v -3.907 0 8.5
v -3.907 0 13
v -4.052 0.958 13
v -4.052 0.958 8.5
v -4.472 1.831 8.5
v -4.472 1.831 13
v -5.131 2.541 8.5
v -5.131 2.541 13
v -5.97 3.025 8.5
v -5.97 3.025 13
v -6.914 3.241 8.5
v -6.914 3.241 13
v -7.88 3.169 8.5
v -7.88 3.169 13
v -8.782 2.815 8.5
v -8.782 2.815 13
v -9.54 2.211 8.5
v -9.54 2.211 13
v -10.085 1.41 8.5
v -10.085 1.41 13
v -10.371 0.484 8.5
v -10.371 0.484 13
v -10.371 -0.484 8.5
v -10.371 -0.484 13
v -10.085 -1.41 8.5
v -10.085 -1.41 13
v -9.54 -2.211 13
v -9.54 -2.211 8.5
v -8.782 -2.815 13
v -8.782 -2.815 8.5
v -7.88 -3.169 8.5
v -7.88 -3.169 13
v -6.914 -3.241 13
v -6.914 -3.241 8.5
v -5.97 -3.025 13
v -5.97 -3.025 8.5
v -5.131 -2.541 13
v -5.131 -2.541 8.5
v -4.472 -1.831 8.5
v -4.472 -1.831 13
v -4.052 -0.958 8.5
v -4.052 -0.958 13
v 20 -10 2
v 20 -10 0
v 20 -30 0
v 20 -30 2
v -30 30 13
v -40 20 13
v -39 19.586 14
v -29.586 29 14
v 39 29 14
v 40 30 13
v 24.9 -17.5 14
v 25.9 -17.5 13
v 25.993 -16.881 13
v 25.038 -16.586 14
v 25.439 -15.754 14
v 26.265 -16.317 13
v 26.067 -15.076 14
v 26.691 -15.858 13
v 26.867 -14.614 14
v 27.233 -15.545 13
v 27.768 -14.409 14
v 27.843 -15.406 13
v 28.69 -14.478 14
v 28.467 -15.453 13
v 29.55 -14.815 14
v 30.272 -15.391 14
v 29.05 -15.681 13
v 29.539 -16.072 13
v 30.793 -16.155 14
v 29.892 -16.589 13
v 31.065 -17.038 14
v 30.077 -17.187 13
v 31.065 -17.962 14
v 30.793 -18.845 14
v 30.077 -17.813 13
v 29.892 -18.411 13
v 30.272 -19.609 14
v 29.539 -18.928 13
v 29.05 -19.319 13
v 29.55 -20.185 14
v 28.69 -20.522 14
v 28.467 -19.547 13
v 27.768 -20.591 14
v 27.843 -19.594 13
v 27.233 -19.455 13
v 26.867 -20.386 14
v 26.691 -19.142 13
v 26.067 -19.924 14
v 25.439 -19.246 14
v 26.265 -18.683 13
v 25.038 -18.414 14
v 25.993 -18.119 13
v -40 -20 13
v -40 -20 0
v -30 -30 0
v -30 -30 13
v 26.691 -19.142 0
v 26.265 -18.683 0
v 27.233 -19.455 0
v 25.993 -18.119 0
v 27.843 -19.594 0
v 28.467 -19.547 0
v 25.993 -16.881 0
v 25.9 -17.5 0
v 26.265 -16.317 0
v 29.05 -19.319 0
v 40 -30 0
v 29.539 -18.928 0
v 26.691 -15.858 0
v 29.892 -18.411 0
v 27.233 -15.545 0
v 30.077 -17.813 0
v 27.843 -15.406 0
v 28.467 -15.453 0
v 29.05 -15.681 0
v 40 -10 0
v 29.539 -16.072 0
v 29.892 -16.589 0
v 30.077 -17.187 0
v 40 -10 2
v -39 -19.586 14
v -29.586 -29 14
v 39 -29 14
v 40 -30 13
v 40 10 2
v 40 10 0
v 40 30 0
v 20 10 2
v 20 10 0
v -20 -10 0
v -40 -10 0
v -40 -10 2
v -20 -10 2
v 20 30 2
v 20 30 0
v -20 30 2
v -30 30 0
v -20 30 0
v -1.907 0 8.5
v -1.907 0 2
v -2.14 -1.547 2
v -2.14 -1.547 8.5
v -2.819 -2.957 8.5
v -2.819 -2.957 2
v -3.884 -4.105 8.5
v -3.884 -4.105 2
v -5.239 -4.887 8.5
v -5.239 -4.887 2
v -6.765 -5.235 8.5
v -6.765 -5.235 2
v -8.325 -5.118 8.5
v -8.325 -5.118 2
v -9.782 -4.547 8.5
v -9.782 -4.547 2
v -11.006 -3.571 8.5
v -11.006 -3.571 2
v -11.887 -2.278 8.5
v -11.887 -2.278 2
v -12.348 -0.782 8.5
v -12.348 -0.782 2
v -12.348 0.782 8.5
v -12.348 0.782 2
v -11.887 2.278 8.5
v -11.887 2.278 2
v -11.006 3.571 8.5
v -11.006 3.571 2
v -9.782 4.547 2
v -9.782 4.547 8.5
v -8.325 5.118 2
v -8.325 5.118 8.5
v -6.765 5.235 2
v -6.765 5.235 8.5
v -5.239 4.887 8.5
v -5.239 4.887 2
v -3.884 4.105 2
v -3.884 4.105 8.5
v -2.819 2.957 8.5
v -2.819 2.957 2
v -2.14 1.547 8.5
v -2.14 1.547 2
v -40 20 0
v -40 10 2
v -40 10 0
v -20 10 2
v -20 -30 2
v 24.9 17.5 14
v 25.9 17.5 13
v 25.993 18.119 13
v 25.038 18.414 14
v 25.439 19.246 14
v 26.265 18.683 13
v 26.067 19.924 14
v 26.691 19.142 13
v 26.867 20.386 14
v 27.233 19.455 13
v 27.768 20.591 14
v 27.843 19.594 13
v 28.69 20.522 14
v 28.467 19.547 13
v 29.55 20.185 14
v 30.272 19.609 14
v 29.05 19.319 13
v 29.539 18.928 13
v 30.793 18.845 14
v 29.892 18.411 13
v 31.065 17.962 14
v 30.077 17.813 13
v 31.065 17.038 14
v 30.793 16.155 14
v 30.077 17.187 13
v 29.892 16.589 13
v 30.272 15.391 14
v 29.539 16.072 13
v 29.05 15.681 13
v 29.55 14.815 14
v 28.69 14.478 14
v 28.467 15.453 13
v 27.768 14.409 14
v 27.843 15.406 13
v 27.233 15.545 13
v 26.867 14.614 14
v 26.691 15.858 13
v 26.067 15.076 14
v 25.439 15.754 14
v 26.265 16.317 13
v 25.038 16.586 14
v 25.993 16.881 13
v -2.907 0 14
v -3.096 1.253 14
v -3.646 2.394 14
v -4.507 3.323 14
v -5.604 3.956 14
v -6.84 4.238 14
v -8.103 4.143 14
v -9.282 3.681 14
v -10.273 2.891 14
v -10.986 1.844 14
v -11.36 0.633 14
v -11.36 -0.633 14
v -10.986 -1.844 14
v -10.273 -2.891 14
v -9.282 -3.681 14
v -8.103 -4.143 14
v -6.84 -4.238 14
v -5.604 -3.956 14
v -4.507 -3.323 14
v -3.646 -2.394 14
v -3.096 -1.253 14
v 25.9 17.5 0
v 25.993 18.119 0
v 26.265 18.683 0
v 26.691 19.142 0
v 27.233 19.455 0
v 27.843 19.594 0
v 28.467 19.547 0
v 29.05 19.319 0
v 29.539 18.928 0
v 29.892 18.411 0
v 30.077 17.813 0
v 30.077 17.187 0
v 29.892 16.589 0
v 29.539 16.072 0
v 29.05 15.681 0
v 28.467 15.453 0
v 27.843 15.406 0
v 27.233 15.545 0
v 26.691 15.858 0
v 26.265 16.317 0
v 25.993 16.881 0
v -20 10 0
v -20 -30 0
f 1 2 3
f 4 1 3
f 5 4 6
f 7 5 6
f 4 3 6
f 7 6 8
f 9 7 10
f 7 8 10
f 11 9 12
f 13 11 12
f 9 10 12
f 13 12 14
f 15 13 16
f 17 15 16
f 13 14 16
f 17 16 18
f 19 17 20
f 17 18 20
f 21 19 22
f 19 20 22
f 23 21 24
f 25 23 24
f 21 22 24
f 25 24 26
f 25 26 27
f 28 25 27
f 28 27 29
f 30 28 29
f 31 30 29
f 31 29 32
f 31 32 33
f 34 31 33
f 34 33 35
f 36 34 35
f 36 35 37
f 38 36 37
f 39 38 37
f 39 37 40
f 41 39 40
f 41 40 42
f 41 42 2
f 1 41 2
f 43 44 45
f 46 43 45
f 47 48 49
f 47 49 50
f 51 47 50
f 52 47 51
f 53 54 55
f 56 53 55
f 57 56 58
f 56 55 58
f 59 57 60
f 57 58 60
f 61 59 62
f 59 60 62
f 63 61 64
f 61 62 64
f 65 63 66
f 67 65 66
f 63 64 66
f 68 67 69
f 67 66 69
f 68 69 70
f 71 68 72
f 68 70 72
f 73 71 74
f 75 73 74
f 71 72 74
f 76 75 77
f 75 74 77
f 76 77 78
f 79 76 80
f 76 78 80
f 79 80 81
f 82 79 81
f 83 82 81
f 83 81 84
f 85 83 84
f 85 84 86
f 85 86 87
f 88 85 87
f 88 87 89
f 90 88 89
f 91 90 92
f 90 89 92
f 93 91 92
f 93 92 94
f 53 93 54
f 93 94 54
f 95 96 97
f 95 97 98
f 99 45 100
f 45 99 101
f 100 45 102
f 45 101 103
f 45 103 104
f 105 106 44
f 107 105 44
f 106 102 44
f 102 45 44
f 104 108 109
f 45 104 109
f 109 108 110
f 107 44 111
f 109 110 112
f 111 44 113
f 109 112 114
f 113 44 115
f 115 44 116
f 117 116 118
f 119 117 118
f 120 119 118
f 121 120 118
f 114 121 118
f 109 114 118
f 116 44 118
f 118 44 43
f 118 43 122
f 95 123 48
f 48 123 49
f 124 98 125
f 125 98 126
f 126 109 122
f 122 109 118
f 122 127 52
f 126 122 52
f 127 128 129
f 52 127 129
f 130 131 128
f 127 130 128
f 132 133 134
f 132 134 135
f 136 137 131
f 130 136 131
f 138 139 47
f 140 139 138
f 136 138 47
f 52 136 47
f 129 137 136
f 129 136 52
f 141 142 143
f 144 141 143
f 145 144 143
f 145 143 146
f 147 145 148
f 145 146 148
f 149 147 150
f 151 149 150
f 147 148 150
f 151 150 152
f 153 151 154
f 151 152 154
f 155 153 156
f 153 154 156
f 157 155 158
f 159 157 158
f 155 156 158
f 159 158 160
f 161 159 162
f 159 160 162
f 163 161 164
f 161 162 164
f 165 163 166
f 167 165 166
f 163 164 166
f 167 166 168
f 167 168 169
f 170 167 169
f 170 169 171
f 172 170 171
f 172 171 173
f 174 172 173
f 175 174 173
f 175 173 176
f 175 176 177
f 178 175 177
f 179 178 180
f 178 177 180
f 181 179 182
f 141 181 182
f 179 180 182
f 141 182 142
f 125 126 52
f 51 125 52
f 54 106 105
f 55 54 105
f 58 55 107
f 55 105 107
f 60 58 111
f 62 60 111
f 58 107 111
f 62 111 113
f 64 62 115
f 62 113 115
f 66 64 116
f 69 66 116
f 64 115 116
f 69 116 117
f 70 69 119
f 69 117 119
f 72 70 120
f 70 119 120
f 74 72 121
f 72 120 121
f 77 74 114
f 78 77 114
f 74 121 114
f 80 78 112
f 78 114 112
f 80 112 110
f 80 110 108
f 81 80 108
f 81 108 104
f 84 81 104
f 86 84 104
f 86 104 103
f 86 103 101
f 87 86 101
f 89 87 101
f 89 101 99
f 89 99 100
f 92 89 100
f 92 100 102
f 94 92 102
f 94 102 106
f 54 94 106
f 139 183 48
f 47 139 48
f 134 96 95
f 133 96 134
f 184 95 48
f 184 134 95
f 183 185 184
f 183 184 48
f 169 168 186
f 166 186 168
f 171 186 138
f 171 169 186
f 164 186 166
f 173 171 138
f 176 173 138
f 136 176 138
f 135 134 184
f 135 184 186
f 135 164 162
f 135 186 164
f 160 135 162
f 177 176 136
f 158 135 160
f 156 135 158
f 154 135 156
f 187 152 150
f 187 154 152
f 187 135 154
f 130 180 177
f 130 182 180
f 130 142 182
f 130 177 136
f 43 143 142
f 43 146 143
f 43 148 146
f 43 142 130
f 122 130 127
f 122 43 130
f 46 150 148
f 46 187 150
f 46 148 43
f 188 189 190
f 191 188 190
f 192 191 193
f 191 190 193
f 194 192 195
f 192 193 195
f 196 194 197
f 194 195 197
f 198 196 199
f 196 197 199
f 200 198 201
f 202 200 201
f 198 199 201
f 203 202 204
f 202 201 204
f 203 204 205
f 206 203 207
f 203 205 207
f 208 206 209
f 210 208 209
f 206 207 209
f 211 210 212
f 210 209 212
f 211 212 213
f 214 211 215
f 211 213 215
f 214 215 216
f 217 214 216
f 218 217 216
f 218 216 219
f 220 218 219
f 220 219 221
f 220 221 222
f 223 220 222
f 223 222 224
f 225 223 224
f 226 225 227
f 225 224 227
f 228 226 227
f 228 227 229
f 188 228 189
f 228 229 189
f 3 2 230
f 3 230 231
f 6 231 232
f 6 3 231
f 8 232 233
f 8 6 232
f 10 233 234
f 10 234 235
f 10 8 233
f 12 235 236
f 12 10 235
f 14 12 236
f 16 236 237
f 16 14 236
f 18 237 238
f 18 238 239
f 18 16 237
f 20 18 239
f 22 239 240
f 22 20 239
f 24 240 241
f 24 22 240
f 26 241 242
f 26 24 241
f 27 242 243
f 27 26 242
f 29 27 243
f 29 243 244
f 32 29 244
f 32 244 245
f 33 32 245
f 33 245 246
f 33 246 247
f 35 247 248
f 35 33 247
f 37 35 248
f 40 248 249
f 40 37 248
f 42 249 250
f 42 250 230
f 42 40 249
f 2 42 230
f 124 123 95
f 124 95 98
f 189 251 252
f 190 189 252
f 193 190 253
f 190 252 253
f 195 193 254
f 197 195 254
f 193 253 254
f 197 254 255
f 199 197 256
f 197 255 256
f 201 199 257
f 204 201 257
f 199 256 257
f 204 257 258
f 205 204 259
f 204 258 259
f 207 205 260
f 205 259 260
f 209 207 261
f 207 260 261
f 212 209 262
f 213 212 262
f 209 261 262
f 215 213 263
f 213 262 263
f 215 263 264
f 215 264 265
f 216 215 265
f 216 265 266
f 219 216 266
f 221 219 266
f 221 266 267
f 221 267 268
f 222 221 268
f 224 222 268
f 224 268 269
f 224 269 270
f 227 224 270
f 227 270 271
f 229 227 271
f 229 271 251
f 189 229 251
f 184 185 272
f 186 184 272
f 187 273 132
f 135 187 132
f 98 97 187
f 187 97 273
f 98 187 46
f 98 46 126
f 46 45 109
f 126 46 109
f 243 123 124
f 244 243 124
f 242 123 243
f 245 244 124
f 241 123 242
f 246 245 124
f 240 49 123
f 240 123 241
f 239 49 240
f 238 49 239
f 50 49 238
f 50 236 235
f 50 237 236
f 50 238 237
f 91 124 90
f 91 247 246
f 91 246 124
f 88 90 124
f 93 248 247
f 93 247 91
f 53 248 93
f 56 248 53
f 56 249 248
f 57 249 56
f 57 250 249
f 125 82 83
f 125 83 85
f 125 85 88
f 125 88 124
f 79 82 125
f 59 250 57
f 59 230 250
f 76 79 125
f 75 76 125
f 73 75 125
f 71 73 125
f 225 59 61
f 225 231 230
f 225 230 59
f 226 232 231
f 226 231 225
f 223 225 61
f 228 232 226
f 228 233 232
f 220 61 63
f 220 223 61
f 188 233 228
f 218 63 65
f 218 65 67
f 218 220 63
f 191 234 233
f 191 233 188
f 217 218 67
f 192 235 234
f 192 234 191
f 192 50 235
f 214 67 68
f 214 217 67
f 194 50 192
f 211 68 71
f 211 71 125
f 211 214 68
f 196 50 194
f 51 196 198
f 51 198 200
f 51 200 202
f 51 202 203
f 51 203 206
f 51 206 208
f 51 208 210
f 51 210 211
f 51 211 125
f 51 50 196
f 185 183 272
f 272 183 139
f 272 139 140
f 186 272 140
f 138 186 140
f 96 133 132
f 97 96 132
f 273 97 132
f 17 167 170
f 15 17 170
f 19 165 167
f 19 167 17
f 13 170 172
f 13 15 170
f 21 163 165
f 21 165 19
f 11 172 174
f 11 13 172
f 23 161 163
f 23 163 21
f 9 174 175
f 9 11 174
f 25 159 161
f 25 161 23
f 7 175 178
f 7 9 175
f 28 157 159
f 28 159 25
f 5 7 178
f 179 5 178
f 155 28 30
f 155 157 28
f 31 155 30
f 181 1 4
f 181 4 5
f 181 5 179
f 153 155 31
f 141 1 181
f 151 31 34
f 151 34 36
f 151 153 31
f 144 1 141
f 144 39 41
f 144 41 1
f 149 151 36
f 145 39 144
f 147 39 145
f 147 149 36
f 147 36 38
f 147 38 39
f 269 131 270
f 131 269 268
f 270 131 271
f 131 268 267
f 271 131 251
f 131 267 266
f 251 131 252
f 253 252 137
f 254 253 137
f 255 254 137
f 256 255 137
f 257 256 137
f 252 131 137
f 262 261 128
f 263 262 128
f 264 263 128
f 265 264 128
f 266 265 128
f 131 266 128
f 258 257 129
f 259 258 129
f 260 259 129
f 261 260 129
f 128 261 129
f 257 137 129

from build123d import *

# Parameters (mm, degrees)
F0_W      = 80
F0_H      = 60
F1_DEPTH  = 14
F2_W      = 80
F2_H      = 20
F3_DEPTH  = 2
F4_W      = 40
F4_H      = 20
F4_H_2    = 40
F5_DEPTH  = 2
F6_SIZE   = 10
F7_R      = 3.25
F8_DEPTH  = 25
F9_R      = 5.25
F10_DEPTH = 6.5
F12_D     = 4.2
F13_SIZE  = 1


with BuildPart() as f1:
    # F0 (on Top) → F1 (new body)
    with BuildSketch(Plane.XY):
        Rectangle(F0_W, F0_H)
    extrude(amount=F1_DEPTH)

    # F2 (on face) → F3 (cut)
    with BuildSketch(Plane(origin=(0, 0, 0), x_dir=(1, 0, 0), z_dir=(0, 0, -1))):
        Rectangle(F2_W, F2_H)
    extrude(amount=-F3_DEPTH, mode=Mode.SUBTRACT)

    # F4 (on face) → F5 (cut)
    with BuildSketch(Plane(origin=(0, 0, 0), x_dir=(1, 0, 0), z_dir=(0, 0, -1))):
        with Locations((0, 20)):
            Rectangle(F4_W, F4_H)
        with Locations((0, -10)):
            Rectangle(F4_W, F4_H_2)
    extrude(amount=-F5_DEPTH, mode=Mode.SUBTRACT)

    # F6
    f6_edges = [f1.edges().sort_by_distance(p)[0] for p in [
        (-40, 30, 7),
        (-40, -30, 7),
    ]]
    chamfer(f6_edges, length=F6_SIZE)

    # F7 (on face) → F8 (cut)
    with BuildSketch(Plane.XY.offset(14)):
        with Locations((-7.1571292716, 0)):
            Circle(F7_R)
    extrude(amount=-F8_DEPTH, mode=Mode.SUBTRACT)

    # F9 (on face) → F10 (cut)
    with BuildSketch(Plane(origin=(0, 0, 2), x_dir=(1, 0, 0), z_dir=(0, 0, -1))):
        with Locations((-7.1571292716, 0)):
            Circle(F9_R)
    extrude(amount=-F10_DEPTH, mode=Mode.SUBTRACT)

    # F12 (through all)
    with Locations(Plane.XY.offset(14)):
        with Locations((28, 17.5), (28, -17.5)):
            Hole(F12_D / 2)

    # F13
    f13_edges = [f1.edges().sort_by_distance(p)[0] for p in [
        (-40, 0, 14),
        (-35, 25, 14),
        (-35, -25, 14),
        (5, 30, 14),
        (5, -30, 14),
        (40, 0, 14),
        (25.9, -17.5, 14),
        (-10.407129, 0, 14),
        (25.9, 17.5, 14),
    ]]
    chamfer(f13_edges, length=F13_SIZE)


solid = f1.part
